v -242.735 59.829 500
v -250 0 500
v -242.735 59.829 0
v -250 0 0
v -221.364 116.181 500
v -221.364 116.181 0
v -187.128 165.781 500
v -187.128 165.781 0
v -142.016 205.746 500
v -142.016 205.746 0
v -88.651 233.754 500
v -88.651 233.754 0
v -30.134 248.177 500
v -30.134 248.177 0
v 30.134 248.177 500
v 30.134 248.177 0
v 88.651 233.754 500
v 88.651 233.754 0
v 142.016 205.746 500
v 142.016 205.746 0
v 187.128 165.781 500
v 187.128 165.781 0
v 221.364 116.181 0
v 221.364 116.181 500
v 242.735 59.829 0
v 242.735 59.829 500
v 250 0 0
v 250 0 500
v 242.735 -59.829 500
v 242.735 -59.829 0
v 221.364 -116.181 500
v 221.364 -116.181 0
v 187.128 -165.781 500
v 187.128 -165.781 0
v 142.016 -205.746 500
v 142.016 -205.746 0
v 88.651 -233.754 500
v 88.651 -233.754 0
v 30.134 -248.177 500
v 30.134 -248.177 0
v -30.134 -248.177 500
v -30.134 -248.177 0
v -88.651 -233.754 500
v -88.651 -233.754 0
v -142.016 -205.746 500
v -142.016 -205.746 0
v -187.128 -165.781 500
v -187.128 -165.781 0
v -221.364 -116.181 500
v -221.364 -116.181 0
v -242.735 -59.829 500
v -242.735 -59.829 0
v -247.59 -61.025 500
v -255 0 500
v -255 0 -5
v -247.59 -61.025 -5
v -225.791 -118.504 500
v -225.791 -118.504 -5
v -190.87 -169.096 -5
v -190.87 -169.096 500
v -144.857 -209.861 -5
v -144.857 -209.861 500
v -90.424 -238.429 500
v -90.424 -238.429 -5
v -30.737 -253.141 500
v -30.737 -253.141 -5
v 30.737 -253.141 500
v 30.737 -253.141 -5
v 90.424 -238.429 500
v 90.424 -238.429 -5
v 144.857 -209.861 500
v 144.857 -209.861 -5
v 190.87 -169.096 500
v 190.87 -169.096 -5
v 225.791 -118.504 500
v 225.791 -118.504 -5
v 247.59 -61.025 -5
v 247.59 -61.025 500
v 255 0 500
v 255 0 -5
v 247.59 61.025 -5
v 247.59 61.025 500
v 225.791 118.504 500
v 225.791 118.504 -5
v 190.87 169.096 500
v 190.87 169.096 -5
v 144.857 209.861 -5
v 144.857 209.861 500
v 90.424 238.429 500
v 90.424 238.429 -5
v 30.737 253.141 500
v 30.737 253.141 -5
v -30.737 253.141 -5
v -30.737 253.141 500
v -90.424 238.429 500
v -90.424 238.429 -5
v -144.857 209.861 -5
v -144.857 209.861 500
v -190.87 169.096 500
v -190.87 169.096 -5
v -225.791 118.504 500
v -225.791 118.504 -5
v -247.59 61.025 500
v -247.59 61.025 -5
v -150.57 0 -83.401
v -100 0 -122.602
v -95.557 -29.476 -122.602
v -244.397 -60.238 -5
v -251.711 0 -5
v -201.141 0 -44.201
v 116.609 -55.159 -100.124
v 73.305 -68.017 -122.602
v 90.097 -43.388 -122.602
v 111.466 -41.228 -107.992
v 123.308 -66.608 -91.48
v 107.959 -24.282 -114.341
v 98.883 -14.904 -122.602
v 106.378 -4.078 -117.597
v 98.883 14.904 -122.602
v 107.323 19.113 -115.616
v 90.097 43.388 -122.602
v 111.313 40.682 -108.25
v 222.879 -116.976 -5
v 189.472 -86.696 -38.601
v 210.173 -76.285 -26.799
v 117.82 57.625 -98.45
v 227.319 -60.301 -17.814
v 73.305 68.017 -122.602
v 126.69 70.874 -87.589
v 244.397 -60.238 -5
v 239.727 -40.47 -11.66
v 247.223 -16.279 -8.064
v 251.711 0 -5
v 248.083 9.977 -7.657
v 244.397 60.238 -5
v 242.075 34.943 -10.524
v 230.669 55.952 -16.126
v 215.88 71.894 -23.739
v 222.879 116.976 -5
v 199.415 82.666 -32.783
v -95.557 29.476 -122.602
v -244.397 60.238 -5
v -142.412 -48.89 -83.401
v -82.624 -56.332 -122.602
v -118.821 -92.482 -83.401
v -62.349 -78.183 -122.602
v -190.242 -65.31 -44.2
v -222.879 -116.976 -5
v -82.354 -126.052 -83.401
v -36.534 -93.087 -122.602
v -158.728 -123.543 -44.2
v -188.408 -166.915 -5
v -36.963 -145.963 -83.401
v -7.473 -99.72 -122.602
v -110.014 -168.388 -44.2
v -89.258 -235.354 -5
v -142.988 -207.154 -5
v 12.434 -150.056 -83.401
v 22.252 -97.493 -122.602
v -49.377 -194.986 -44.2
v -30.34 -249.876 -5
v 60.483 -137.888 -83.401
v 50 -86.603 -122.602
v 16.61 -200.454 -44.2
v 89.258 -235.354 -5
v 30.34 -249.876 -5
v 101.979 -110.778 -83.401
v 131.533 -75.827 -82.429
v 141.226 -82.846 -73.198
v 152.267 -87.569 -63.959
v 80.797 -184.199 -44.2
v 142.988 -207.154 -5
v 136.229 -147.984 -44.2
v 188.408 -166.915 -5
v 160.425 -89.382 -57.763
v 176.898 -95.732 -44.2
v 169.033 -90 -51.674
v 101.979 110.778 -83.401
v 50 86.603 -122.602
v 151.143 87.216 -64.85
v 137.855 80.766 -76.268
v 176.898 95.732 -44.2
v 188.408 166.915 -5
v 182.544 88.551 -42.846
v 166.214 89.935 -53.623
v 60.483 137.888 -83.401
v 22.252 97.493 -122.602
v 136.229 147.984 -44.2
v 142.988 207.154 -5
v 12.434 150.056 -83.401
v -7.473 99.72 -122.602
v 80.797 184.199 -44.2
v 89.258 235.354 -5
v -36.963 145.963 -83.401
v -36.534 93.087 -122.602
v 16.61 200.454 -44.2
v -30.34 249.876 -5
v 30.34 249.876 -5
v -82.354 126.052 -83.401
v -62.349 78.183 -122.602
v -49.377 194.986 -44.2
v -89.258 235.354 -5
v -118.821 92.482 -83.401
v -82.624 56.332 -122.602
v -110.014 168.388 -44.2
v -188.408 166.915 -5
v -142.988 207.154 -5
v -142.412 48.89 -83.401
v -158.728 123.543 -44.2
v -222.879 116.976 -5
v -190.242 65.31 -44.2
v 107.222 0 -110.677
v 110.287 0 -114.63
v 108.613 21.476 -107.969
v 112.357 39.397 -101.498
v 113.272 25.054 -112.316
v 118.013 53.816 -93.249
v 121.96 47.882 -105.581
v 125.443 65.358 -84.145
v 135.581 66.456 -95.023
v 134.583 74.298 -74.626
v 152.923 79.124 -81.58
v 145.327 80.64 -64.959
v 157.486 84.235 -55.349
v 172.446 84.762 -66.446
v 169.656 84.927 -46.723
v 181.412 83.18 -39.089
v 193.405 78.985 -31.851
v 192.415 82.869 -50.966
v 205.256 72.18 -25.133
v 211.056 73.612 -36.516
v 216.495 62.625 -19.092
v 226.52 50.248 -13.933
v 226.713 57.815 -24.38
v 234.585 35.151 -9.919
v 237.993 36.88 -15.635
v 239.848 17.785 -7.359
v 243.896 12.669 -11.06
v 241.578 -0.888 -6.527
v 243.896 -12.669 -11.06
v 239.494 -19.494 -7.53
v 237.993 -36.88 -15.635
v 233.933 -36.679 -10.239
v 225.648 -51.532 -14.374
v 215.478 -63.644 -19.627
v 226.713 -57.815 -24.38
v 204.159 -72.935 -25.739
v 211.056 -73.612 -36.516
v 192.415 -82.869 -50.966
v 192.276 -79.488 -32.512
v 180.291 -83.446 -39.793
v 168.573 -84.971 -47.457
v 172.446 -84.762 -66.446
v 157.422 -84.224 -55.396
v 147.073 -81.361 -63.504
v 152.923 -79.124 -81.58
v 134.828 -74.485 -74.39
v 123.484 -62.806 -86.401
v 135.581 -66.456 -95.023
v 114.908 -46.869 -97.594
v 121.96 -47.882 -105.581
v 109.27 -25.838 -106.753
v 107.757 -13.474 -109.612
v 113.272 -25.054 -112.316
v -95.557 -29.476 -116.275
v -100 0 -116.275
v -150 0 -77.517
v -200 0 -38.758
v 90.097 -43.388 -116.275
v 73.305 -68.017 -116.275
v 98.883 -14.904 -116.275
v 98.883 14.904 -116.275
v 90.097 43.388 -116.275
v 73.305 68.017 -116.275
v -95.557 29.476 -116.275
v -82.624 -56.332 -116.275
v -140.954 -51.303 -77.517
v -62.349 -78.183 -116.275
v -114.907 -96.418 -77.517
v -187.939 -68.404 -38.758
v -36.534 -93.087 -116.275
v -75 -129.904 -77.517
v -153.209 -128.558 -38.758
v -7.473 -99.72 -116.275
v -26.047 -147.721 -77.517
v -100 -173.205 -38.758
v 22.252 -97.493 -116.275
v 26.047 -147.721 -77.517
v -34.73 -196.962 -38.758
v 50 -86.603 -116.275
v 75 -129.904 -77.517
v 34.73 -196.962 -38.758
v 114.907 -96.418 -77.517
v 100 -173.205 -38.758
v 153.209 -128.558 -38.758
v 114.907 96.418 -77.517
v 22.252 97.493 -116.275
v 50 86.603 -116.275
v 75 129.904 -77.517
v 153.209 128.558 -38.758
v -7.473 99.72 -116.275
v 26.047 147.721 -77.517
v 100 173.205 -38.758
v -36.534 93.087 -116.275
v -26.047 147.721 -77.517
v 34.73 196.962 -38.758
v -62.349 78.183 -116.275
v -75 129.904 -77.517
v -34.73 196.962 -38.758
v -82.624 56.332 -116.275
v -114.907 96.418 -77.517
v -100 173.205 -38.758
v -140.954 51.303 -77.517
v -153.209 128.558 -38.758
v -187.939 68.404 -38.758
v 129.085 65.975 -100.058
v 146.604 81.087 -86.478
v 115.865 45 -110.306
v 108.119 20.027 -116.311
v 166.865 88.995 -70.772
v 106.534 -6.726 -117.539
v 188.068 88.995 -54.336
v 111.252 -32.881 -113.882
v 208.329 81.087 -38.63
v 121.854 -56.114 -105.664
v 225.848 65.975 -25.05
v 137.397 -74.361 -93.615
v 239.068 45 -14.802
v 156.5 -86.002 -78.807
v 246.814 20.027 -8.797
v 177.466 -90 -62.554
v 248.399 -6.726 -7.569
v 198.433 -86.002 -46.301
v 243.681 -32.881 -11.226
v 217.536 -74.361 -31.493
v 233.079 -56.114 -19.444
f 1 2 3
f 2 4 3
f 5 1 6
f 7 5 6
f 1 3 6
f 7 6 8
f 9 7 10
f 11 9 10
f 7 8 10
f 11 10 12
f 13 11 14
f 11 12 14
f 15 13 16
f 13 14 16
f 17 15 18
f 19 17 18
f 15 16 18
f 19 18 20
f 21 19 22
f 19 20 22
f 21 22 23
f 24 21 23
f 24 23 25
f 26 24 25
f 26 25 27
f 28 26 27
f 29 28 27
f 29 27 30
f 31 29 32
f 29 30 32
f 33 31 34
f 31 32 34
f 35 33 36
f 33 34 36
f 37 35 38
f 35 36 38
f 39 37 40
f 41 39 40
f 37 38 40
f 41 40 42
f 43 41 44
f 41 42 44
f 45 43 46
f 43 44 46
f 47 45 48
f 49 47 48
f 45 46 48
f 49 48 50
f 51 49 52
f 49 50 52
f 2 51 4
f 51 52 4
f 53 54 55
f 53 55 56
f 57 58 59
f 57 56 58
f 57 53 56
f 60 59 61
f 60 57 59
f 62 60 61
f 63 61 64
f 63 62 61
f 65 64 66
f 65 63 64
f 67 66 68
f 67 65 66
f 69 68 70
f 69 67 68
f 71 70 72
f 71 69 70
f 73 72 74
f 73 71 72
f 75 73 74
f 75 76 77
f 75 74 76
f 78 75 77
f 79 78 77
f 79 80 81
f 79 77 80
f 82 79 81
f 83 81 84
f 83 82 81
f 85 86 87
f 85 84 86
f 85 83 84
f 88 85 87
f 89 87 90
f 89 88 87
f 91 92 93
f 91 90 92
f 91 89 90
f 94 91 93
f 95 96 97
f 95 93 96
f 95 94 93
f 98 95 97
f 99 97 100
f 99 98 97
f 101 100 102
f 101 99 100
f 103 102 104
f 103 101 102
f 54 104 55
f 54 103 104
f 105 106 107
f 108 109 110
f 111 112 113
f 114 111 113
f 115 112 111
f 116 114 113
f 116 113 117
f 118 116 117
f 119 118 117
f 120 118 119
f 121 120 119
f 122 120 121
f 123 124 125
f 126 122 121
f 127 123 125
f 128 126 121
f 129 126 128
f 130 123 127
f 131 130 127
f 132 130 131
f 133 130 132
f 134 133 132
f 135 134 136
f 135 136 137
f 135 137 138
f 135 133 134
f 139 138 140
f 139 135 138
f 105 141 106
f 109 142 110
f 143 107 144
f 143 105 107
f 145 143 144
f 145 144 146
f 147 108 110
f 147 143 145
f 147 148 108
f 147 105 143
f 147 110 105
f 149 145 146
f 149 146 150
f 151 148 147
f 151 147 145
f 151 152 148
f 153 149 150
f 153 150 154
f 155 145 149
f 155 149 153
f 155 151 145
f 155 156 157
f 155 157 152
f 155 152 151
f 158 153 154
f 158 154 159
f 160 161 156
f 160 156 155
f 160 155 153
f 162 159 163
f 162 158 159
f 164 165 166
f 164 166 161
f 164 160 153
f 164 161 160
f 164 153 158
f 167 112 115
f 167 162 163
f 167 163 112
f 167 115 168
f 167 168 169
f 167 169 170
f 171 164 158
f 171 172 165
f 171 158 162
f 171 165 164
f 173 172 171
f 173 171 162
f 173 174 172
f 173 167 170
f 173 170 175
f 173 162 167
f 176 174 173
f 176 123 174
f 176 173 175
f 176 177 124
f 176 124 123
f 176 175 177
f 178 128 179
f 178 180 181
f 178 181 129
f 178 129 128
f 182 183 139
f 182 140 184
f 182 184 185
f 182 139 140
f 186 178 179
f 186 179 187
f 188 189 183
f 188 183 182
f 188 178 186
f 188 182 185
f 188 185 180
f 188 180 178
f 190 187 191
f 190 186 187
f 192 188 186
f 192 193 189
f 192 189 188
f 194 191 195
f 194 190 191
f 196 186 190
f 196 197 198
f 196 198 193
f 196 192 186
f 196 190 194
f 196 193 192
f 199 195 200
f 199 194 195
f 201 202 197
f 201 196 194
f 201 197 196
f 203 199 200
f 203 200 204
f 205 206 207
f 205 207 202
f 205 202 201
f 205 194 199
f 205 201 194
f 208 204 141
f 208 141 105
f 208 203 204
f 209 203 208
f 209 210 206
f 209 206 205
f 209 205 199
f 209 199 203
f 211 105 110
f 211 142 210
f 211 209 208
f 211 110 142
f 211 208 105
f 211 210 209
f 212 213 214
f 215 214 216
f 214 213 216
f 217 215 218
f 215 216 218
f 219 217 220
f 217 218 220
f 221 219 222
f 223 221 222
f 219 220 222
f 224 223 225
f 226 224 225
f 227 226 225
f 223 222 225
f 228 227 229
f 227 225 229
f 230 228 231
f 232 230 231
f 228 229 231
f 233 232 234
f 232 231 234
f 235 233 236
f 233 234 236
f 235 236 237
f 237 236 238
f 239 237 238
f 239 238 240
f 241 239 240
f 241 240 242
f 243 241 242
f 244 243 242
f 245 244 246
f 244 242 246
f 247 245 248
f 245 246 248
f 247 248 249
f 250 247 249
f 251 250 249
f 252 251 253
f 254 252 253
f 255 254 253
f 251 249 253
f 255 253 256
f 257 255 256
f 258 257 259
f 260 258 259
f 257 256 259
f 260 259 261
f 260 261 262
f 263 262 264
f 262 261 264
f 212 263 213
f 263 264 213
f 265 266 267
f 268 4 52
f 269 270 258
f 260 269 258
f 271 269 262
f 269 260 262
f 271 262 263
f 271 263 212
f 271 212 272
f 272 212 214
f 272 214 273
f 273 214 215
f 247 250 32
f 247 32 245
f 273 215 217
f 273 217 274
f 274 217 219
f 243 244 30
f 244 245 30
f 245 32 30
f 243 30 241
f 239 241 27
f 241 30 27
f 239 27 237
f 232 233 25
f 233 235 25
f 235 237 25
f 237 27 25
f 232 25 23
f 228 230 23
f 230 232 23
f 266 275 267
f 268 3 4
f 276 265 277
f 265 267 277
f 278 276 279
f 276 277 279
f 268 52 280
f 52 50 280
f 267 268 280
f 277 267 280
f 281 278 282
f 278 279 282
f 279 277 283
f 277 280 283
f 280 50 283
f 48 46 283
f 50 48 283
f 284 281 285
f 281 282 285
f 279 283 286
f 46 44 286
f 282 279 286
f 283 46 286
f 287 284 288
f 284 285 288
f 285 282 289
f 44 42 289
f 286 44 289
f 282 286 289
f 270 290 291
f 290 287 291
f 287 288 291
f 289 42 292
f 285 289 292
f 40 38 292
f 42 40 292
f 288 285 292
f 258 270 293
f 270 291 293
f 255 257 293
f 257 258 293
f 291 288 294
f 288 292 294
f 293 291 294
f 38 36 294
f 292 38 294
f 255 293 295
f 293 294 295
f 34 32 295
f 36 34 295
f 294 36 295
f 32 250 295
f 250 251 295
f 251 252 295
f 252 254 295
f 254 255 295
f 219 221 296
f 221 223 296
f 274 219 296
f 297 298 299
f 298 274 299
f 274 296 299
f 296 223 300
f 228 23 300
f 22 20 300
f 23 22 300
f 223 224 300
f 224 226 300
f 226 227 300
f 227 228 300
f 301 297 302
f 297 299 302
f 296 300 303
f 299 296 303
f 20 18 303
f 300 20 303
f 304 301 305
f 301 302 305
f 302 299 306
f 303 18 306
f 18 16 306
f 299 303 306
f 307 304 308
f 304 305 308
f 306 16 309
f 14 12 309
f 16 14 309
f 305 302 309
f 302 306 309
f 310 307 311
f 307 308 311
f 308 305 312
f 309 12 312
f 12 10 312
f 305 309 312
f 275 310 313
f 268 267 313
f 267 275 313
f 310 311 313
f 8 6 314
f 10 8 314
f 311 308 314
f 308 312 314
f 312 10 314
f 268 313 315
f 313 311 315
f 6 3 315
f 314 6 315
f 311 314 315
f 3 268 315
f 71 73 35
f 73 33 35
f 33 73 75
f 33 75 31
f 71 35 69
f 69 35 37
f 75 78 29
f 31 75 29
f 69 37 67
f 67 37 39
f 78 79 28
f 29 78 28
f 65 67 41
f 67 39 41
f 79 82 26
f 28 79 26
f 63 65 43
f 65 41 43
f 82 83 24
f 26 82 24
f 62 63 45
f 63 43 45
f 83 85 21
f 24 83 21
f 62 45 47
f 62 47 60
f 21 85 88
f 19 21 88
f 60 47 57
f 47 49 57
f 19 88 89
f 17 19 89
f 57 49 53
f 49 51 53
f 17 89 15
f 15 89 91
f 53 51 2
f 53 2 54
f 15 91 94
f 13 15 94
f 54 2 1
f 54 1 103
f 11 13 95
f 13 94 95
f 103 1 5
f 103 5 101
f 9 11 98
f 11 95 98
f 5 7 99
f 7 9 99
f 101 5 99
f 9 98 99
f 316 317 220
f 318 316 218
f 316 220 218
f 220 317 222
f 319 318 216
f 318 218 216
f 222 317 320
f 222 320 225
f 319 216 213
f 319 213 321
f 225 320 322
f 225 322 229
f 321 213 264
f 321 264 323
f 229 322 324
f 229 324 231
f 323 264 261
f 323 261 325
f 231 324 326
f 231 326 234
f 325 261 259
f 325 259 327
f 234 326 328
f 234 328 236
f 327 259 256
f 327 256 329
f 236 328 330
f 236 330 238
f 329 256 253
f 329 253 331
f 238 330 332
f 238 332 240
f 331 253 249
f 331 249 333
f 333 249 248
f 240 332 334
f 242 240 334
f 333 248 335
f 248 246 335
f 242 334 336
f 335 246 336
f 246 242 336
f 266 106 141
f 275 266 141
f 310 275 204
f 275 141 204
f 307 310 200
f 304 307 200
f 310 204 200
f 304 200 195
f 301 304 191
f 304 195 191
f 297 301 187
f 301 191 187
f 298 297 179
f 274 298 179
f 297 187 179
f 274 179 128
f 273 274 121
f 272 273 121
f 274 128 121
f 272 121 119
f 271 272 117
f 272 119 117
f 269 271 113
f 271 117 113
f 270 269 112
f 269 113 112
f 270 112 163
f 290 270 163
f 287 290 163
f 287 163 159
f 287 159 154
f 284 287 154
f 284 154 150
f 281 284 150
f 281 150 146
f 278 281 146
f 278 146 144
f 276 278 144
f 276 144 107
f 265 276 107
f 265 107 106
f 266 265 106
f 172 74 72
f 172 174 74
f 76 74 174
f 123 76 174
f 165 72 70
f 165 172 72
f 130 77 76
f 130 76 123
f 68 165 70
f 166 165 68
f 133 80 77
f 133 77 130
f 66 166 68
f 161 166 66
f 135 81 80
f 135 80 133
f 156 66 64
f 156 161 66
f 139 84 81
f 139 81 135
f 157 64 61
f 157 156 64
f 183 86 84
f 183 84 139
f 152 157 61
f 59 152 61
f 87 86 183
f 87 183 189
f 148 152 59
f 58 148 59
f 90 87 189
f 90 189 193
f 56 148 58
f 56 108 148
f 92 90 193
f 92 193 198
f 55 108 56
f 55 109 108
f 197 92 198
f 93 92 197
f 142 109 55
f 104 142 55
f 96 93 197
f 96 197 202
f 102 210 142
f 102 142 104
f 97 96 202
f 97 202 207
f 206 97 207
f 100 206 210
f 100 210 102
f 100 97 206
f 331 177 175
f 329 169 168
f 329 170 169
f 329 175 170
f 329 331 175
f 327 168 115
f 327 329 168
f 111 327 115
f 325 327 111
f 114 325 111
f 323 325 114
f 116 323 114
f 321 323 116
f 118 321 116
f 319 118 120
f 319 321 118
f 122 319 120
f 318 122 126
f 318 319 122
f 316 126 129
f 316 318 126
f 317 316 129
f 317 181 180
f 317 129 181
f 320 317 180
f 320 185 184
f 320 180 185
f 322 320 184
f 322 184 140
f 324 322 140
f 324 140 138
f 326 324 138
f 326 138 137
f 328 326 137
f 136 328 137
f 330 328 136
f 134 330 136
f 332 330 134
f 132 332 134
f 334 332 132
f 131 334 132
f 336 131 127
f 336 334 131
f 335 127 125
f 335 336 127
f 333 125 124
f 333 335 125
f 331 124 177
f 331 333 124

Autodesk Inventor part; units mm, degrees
ref_plane "YZ Plane" through (0, 0, 0) normal (1, 0, 0) x (0, 1, 0)
ref_plane "XZ Plane" through (0, 0, 0) normal (0, 1, 0) x (-1, 0, 0)
ref_plane "XY Plane" through (0, 0, 0) normal (0, 0, 1) x (1, 0, 0)
sketch "Skizze1" plane through (0, 0, 0) normal (0, 1, 0) x (-1, 0, 0)
  line L0 (0, 82.3152) -> (0, -45.1122)
  line L1 (250, 500) -> (250, 0)
  line L2 (250, 0) -> (250, 0)
  line L3 (250, 0) -> (100, -116.2752)
  line L4 (100, -116.2752) -> (100, -122.6015)
  line L5 (100, -122.6015) -> (251.711, -5)
  line L6 (251.711, -5) -> (255, -5)
  line L7 (255, -5) -> (255, 500)
  line L8 (255, 500) -> (250, 500)
  line L9 (306, 0) -> (-51, 0) projected
  point P0 (0, 0)
  dimension "d0" = 5
  dimension "d1" = 5
  dimension "d2" = 5
  dimension "d3" = 500
  dimension "d4" = 500
  dimension "d5" = 500
  dimension "d6" = 200
revolve "Umdrehung1" add sketch "Skizze1" angle 360 about axis through (0, 0, 82.3152) along (0, 0, -1)
sketch "Skizze3" plane through (0, 0, 0) normal (0, 1, 0) x (-1, 0, 0)
  line L0 (-251.711, -5) -> (-100, -122.6015) projected
  line L1 (-397.6603, 108.1352) -> (-63.9838, -150.52)
  point P0 (0, 0)
ref_plane "Arbeitsebene1" through (397.6603, 0, 108.1352) normal (-0.6127, 0, 0.7904) x (0, -1, 0)
sketch "Skizze4" plane through (397.6603, 0, 108.1352) normal (-0.6127, 0, 0.7904) x (0, -1, 0)
  circle A0 centre (0, -278.6039) radius 90
  ellipse E0 centre (0, -383.6039) end of major axis (251.711, -383.6039) minor radius 198.94 projected
  point P0 (0, -380.5407)
  dimension "d12" = 180
  dimension "d13" = 105
extrude "Extrusion2" add sketch "Skizze4" along normal up to surface contours A0
sketch "Skizze5" plane through (397.6603, 0, 108.1352) normal (0.6127, 0, -0.7904) x (-0.7904, 0, -0.6127)
  circle A0 centre (278.6039, 0) radius 85
  arc A1 (368.6039, 0) -> (188.6039, 0) centre (278.6039, 0) ccw projected
  point P0 (380.5407, 0)
  dimension "d16" = 170
extrude "Extrusion3" cut sketch "Skizze5" against normal up to surface
equation "\"d1\" = d0"
equation "\"d2\" = d0"
properties part number "Tank_1"
